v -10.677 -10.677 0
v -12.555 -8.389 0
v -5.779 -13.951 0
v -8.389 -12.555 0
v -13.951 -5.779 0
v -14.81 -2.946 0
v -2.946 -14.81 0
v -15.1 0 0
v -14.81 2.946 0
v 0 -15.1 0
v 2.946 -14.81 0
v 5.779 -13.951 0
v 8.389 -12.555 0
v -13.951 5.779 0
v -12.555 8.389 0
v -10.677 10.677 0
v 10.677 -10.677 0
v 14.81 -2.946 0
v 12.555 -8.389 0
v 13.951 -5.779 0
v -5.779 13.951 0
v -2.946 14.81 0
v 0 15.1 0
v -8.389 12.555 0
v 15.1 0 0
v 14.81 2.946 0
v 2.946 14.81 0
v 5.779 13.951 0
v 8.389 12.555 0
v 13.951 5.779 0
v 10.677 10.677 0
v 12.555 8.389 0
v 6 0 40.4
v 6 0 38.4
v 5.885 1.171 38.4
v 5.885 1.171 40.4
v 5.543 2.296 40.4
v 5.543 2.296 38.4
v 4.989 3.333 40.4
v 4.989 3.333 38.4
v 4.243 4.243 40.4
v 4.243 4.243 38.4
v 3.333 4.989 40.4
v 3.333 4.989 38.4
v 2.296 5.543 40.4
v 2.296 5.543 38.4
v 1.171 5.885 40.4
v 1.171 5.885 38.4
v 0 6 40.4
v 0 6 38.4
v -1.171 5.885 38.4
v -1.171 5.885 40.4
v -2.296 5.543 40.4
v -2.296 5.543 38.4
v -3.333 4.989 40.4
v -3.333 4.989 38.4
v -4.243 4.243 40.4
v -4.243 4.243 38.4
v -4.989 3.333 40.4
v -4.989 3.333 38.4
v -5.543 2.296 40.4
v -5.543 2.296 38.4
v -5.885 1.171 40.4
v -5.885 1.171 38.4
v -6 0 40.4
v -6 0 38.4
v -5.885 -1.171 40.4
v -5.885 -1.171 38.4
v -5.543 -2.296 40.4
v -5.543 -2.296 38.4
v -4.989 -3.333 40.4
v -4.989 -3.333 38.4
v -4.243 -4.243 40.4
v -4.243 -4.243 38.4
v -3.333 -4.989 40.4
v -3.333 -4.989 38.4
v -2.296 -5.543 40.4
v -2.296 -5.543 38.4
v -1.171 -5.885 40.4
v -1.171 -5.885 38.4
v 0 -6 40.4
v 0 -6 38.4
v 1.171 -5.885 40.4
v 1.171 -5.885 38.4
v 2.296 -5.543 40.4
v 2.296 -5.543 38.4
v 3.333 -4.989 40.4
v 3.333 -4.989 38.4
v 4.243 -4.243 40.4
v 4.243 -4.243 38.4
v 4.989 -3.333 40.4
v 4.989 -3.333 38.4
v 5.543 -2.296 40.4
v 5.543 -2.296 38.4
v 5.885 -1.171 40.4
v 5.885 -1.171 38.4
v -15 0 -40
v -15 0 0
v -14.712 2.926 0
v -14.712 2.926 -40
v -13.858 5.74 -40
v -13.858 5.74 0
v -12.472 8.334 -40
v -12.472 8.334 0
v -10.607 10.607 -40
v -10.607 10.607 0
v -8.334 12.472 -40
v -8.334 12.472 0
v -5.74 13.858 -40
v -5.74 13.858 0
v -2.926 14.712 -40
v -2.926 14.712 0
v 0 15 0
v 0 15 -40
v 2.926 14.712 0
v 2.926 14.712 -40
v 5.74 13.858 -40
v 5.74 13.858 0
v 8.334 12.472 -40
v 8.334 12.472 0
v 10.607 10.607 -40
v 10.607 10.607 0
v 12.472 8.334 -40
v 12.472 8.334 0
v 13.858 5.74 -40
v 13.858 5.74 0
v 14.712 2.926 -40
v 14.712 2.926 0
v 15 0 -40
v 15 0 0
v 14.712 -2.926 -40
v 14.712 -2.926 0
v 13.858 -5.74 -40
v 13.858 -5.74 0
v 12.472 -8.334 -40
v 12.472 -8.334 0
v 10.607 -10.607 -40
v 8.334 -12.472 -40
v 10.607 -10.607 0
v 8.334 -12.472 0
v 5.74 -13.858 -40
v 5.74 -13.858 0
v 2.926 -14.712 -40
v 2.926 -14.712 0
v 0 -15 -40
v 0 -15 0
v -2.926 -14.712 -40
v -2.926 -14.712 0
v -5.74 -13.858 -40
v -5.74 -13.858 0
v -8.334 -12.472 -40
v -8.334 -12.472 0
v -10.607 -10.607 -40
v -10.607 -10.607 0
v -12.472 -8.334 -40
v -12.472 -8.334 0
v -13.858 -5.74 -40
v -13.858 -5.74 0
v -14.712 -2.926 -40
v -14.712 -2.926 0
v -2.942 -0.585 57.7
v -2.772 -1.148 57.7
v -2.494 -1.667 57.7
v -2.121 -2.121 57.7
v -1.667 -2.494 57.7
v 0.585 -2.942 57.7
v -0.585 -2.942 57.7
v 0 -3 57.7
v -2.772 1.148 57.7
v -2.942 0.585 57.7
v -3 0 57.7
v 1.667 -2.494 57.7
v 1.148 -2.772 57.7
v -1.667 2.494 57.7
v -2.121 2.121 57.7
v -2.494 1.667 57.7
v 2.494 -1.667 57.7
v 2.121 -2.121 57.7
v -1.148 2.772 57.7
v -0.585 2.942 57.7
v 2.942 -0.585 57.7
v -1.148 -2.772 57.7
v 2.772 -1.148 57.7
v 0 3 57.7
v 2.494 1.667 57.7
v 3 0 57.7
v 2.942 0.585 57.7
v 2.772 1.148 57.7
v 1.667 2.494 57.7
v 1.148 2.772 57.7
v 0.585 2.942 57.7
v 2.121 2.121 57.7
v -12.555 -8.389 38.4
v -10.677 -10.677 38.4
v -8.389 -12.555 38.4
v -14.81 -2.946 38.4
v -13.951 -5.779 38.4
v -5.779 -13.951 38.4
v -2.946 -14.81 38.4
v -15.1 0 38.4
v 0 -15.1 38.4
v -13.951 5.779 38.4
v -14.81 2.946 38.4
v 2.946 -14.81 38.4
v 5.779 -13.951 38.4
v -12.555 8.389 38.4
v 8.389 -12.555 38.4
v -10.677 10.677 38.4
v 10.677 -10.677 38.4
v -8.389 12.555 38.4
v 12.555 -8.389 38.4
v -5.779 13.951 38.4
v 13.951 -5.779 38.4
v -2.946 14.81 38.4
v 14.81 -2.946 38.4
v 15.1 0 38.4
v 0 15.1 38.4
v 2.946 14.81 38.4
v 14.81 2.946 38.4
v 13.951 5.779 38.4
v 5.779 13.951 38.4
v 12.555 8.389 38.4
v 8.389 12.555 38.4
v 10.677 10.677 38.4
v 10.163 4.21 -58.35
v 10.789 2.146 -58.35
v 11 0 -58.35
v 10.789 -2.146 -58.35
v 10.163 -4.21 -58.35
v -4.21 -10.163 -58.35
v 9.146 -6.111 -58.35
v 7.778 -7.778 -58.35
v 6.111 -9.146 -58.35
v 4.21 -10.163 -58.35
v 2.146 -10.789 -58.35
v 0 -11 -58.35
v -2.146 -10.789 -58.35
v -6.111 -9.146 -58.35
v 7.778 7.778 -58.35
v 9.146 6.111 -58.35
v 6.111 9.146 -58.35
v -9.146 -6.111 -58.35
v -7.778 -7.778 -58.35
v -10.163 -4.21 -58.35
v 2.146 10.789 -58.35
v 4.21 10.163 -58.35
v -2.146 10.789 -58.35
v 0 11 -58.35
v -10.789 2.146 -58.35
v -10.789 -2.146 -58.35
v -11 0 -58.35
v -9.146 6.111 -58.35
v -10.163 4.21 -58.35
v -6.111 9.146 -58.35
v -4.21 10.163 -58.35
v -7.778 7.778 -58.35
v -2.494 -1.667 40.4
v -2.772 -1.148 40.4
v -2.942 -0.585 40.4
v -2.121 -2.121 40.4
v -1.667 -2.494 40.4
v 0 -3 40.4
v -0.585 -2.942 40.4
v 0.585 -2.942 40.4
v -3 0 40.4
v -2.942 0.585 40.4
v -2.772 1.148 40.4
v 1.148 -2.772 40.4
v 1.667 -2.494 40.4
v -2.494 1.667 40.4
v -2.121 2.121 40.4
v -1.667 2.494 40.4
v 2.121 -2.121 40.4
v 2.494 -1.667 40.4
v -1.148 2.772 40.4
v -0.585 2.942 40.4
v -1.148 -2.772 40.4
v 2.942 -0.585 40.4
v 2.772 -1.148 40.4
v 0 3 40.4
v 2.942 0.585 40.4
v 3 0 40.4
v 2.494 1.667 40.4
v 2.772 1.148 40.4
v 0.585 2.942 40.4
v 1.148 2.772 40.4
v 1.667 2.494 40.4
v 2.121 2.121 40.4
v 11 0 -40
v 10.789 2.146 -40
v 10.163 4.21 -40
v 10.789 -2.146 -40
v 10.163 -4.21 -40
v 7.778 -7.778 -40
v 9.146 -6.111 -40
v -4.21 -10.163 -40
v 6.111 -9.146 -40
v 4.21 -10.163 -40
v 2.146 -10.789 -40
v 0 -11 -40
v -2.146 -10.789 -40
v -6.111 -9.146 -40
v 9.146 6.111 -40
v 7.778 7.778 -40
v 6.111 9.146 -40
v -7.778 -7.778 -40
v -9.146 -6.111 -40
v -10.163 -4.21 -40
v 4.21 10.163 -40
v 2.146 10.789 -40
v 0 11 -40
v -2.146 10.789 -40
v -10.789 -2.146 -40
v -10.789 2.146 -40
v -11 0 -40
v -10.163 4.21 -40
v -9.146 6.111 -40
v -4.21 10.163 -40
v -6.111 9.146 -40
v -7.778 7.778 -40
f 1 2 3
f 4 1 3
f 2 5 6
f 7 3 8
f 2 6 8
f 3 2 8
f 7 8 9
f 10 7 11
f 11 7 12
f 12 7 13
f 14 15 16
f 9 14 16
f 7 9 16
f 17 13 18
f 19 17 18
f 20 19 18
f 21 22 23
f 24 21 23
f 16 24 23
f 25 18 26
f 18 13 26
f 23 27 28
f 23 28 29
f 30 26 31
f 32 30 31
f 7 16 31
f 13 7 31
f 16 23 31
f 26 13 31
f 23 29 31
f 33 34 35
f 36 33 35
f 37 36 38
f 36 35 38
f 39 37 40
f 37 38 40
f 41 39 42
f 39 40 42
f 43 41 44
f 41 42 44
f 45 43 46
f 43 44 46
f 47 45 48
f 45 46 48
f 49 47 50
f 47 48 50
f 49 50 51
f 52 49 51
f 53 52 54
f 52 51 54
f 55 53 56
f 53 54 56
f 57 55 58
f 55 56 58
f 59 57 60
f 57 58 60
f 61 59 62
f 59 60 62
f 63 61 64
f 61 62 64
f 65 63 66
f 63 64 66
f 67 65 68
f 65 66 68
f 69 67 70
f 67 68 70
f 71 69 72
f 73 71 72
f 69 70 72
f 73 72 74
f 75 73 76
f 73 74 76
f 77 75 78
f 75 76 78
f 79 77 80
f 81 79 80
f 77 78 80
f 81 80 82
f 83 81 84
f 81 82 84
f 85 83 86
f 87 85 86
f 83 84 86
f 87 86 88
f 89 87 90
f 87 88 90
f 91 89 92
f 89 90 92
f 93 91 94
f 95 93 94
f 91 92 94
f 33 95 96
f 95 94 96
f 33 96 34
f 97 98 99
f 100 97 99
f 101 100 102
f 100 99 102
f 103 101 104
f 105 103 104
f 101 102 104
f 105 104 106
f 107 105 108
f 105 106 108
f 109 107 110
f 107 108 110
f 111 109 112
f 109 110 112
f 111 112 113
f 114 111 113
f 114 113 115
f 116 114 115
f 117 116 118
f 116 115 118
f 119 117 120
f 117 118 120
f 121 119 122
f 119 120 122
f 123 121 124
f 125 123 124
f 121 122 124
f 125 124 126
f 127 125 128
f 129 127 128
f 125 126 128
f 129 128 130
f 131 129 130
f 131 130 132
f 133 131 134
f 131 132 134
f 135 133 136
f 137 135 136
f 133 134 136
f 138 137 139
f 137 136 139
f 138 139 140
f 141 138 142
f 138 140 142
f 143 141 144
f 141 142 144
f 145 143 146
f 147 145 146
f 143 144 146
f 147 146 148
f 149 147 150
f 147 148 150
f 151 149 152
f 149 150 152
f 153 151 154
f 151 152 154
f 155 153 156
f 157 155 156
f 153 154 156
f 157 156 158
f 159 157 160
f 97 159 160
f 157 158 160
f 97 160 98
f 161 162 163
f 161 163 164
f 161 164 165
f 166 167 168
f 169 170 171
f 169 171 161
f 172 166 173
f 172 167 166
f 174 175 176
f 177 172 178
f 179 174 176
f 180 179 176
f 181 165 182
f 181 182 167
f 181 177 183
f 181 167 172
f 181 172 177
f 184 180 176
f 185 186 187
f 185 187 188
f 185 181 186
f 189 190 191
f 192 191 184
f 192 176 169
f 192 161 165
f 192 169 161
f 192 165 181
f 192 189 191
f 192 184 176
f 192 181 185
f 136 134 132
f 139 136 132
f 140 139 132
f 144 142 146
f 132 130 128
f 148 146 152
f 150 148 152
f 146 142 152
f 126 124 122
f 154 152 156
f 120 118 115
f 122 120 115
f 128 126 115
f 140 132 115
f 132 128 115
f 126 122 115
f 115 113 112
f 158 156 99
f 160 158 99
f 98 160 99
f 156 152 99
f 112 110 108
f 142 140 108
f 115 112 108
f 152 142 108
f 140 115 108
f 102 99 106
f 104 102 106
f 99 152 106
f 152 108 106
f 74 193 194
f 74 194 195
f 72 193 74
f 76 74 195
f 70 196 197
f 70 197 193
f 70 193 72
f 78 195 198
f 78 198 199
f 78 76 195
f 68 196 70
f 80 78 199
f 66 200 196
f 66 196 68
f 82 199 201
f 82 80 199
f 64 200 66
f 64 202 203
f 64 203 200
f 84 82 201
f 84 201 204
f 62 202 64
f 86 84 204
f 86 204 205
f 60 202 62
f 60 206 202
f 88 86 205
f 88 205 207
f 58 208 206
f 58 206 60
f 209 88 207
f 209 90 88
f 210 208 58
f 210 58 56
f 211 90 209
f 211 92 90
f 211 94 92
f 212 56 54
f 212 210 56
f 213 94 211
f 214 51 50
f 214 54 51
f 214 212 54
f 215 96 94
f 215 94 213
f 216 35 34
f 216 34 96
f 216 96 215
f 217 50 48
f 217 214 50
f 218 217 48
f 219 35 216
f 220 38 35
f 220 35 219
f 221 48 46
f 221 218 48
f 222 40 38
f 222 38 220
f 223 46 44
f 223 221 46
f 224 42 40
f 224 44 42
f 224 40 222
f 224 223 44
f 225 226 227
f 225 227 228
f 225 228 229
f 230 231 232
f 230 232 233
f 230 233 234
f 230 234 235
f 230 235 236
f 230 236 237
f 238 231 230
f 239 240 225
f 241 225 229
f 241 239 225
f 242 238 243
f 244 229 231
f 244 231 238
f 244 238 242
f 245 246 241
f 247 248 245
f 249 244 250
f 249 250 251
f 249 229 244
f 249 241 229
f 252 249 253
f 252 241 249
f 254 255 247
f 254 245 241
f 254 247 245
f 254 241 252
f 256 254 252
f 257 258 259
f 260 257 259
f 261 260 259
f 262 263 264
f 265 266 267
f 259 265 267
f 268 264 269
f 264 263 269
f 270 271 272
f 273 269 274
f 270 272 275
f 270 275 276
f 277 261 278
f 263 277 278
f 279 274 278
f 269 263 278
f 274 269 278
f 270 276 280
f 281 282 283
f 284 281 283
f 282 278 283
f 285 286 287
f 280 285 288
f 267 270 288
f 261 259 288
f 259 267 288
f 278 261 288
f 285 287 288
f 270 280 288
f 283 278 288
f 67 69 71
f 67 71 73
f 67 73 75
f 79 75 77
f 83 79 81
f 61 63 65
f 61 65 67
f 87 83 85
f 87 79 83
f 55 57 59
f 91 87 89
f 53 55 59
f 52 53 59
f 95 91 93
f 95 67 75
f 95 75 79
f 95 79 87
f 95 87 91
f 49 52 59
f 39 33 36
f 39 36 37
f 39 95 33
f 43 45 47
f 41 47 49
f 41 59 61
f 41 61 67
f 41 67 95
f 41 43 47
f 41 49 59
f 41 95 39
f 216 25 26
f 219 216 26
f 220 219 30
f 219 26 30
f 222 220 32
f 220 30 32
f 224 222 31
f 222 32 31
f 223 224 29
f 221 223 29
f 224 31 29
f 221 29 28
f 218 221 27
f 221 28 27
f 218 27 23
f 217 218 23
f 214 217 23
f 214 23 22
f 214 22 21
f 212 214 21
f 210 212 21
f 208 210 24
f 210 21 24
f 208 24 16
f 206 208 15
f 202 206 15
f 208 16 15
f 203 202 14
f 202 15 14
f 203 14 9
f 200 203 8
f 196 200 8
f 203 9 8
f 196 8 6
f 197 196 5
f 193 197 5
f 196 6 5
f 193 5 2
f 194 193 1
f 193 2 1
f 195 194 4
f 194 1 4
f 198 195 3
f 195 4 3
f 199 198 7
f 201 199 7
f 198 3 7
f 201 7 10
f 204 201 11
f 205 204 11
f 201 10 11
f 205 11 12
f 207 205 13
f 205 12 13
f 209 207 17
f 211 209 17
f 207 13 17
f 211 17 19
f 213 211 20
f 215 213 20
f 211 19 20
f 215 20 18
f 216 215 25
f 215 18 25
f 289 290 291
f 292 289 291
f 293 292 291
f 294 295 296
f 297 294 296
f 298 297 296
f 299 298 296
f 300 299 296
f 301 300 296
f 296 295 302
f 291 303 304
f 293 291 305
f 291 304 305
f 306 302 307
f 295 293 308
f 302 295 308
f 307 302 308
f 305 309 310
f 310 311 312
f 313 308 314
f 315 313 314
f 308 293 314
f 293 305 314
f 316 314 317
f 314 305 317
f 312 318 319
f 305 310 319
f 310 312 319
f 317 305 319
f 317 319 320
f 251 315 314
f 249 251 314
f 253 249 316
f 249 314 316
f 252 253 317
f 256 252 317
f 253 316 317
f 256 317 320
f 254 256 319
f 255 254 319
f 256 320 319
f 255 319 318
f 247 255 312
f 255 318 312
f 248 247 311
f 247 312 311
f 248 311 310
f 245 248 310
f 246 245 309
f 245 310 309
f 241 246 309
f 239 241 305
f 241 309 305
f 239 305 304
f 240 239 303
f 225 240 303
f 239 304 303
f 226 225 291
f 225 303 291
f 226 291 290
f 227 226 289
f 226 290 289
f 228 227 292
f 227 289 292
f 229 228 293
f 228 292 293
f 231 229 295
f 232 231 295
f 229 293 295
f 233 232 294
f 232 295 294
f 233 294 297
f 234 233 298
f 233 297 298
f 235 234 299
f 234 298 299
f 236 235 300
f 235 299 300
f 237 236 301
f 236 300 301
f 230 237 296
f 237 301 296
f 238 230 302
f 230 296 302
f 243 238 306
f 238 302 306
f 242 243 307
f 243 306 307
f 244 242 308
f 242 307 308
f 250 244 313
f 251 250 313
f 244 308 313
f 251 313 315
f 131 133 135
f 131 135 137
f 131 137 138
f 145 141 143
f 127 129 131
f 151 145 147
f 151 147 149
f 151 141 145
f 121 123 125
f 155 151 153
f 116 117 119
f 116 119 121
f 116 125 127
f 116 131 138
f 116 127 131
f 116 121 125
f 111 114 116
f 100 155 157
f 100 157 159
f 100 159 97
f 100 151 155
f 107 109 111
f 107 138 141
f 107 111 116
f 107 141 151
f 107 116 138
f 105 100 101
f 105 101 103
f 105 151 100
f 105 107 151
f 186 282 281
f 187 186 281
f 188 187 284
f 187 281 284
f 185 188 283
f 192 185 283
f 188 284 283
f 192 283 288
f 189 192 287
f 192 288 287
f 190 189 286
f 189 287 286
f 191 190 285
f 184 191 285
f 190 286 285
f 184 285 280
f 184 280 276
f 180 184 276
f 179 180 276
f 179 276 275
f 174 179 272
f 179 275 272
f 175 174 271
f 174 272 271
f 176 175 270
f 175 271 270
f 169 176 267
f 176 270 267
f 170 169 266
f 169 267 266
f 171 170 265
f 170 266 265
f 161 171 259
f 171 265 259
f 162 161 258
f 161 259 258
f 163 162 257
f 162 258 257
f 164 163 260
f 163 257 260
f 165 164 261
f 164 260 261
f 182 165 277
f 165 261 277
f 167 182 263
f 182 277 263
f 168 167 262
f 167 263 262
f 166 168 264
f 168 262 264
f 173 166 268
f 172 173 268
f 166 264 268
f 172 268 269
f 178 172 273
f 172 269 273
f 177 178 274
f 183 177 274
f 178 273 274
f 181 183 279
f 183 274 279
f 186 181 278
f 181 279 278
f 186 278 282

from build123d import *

# Parameters (mm, degrees)
SKETCH1_R           = 15.1
BOSS_EXTRUDE1_DEPTH = 38.4
SKETCH2_R           = 15
BOSS_EXTRUDE2_DEPTH = 40
SKETCH3_R           = 6
BOSS_EXTRUDE3_DEPTH = 2
SKETCH4_R           = 11
BOSS_EXTRUDE4_DEPTH = 18.35
SKETCH5_R           = 3
BOSS_EXTRUDE5_DEPTH = 17.3


with BuildPart() as part:
    # Sketch1 → Boss-Extrude1 (new body)
    with BuildSketch(Plane.XY):
        Circle(SKETCH1_R)
    extrude(amount=BOSS_EXTRUDE1_DEPTH)

    # Sketch3 → Boss-Extrude3 (add)
    with BuildSketch(Plane.XY.offset(38.4)):
        Circle(SKETCH3_R)
    extrude(amount=BOSS_EXTRUDE3_DEPTH)


with BuildPart() as body_2:
    # Sketch2 → Boss-Extrude2 (new body)
    with BuildSketch(Plane(origin=(0, 0, 0), x_dir=(-1, 0, 0), z_dir=(0, 0, -1))):
        Circle(SKETCH2_R)
    extrude(amount=BOSS_EXTRUDE2_DEPTH)


with BuildPart() as body_3:
    # Sketch4 → Boss-Extrude4 (new body)
    with BuildSketch(Plane(origin=(0, 0, -40), x_dir=(-1, 0, 0), z_dir=(0, 0, -1))):
        Circle(SKETCH4_R)
    extrude(amount=BOSS_EXTRUDE4_DEPTH)


with BuildPart() as body_4:
    # Sketch5 → Boss-Extrude5 (new body)
    with BuildSketch(Plane.XY.offset(40.4)):
        Circle(SKETCH5_R)
    extrude(amount=BOSS_EXTRUDE5_DEPTH)


solid = Compound([part.part, body_2.part, body_3.part, body_4.part])
